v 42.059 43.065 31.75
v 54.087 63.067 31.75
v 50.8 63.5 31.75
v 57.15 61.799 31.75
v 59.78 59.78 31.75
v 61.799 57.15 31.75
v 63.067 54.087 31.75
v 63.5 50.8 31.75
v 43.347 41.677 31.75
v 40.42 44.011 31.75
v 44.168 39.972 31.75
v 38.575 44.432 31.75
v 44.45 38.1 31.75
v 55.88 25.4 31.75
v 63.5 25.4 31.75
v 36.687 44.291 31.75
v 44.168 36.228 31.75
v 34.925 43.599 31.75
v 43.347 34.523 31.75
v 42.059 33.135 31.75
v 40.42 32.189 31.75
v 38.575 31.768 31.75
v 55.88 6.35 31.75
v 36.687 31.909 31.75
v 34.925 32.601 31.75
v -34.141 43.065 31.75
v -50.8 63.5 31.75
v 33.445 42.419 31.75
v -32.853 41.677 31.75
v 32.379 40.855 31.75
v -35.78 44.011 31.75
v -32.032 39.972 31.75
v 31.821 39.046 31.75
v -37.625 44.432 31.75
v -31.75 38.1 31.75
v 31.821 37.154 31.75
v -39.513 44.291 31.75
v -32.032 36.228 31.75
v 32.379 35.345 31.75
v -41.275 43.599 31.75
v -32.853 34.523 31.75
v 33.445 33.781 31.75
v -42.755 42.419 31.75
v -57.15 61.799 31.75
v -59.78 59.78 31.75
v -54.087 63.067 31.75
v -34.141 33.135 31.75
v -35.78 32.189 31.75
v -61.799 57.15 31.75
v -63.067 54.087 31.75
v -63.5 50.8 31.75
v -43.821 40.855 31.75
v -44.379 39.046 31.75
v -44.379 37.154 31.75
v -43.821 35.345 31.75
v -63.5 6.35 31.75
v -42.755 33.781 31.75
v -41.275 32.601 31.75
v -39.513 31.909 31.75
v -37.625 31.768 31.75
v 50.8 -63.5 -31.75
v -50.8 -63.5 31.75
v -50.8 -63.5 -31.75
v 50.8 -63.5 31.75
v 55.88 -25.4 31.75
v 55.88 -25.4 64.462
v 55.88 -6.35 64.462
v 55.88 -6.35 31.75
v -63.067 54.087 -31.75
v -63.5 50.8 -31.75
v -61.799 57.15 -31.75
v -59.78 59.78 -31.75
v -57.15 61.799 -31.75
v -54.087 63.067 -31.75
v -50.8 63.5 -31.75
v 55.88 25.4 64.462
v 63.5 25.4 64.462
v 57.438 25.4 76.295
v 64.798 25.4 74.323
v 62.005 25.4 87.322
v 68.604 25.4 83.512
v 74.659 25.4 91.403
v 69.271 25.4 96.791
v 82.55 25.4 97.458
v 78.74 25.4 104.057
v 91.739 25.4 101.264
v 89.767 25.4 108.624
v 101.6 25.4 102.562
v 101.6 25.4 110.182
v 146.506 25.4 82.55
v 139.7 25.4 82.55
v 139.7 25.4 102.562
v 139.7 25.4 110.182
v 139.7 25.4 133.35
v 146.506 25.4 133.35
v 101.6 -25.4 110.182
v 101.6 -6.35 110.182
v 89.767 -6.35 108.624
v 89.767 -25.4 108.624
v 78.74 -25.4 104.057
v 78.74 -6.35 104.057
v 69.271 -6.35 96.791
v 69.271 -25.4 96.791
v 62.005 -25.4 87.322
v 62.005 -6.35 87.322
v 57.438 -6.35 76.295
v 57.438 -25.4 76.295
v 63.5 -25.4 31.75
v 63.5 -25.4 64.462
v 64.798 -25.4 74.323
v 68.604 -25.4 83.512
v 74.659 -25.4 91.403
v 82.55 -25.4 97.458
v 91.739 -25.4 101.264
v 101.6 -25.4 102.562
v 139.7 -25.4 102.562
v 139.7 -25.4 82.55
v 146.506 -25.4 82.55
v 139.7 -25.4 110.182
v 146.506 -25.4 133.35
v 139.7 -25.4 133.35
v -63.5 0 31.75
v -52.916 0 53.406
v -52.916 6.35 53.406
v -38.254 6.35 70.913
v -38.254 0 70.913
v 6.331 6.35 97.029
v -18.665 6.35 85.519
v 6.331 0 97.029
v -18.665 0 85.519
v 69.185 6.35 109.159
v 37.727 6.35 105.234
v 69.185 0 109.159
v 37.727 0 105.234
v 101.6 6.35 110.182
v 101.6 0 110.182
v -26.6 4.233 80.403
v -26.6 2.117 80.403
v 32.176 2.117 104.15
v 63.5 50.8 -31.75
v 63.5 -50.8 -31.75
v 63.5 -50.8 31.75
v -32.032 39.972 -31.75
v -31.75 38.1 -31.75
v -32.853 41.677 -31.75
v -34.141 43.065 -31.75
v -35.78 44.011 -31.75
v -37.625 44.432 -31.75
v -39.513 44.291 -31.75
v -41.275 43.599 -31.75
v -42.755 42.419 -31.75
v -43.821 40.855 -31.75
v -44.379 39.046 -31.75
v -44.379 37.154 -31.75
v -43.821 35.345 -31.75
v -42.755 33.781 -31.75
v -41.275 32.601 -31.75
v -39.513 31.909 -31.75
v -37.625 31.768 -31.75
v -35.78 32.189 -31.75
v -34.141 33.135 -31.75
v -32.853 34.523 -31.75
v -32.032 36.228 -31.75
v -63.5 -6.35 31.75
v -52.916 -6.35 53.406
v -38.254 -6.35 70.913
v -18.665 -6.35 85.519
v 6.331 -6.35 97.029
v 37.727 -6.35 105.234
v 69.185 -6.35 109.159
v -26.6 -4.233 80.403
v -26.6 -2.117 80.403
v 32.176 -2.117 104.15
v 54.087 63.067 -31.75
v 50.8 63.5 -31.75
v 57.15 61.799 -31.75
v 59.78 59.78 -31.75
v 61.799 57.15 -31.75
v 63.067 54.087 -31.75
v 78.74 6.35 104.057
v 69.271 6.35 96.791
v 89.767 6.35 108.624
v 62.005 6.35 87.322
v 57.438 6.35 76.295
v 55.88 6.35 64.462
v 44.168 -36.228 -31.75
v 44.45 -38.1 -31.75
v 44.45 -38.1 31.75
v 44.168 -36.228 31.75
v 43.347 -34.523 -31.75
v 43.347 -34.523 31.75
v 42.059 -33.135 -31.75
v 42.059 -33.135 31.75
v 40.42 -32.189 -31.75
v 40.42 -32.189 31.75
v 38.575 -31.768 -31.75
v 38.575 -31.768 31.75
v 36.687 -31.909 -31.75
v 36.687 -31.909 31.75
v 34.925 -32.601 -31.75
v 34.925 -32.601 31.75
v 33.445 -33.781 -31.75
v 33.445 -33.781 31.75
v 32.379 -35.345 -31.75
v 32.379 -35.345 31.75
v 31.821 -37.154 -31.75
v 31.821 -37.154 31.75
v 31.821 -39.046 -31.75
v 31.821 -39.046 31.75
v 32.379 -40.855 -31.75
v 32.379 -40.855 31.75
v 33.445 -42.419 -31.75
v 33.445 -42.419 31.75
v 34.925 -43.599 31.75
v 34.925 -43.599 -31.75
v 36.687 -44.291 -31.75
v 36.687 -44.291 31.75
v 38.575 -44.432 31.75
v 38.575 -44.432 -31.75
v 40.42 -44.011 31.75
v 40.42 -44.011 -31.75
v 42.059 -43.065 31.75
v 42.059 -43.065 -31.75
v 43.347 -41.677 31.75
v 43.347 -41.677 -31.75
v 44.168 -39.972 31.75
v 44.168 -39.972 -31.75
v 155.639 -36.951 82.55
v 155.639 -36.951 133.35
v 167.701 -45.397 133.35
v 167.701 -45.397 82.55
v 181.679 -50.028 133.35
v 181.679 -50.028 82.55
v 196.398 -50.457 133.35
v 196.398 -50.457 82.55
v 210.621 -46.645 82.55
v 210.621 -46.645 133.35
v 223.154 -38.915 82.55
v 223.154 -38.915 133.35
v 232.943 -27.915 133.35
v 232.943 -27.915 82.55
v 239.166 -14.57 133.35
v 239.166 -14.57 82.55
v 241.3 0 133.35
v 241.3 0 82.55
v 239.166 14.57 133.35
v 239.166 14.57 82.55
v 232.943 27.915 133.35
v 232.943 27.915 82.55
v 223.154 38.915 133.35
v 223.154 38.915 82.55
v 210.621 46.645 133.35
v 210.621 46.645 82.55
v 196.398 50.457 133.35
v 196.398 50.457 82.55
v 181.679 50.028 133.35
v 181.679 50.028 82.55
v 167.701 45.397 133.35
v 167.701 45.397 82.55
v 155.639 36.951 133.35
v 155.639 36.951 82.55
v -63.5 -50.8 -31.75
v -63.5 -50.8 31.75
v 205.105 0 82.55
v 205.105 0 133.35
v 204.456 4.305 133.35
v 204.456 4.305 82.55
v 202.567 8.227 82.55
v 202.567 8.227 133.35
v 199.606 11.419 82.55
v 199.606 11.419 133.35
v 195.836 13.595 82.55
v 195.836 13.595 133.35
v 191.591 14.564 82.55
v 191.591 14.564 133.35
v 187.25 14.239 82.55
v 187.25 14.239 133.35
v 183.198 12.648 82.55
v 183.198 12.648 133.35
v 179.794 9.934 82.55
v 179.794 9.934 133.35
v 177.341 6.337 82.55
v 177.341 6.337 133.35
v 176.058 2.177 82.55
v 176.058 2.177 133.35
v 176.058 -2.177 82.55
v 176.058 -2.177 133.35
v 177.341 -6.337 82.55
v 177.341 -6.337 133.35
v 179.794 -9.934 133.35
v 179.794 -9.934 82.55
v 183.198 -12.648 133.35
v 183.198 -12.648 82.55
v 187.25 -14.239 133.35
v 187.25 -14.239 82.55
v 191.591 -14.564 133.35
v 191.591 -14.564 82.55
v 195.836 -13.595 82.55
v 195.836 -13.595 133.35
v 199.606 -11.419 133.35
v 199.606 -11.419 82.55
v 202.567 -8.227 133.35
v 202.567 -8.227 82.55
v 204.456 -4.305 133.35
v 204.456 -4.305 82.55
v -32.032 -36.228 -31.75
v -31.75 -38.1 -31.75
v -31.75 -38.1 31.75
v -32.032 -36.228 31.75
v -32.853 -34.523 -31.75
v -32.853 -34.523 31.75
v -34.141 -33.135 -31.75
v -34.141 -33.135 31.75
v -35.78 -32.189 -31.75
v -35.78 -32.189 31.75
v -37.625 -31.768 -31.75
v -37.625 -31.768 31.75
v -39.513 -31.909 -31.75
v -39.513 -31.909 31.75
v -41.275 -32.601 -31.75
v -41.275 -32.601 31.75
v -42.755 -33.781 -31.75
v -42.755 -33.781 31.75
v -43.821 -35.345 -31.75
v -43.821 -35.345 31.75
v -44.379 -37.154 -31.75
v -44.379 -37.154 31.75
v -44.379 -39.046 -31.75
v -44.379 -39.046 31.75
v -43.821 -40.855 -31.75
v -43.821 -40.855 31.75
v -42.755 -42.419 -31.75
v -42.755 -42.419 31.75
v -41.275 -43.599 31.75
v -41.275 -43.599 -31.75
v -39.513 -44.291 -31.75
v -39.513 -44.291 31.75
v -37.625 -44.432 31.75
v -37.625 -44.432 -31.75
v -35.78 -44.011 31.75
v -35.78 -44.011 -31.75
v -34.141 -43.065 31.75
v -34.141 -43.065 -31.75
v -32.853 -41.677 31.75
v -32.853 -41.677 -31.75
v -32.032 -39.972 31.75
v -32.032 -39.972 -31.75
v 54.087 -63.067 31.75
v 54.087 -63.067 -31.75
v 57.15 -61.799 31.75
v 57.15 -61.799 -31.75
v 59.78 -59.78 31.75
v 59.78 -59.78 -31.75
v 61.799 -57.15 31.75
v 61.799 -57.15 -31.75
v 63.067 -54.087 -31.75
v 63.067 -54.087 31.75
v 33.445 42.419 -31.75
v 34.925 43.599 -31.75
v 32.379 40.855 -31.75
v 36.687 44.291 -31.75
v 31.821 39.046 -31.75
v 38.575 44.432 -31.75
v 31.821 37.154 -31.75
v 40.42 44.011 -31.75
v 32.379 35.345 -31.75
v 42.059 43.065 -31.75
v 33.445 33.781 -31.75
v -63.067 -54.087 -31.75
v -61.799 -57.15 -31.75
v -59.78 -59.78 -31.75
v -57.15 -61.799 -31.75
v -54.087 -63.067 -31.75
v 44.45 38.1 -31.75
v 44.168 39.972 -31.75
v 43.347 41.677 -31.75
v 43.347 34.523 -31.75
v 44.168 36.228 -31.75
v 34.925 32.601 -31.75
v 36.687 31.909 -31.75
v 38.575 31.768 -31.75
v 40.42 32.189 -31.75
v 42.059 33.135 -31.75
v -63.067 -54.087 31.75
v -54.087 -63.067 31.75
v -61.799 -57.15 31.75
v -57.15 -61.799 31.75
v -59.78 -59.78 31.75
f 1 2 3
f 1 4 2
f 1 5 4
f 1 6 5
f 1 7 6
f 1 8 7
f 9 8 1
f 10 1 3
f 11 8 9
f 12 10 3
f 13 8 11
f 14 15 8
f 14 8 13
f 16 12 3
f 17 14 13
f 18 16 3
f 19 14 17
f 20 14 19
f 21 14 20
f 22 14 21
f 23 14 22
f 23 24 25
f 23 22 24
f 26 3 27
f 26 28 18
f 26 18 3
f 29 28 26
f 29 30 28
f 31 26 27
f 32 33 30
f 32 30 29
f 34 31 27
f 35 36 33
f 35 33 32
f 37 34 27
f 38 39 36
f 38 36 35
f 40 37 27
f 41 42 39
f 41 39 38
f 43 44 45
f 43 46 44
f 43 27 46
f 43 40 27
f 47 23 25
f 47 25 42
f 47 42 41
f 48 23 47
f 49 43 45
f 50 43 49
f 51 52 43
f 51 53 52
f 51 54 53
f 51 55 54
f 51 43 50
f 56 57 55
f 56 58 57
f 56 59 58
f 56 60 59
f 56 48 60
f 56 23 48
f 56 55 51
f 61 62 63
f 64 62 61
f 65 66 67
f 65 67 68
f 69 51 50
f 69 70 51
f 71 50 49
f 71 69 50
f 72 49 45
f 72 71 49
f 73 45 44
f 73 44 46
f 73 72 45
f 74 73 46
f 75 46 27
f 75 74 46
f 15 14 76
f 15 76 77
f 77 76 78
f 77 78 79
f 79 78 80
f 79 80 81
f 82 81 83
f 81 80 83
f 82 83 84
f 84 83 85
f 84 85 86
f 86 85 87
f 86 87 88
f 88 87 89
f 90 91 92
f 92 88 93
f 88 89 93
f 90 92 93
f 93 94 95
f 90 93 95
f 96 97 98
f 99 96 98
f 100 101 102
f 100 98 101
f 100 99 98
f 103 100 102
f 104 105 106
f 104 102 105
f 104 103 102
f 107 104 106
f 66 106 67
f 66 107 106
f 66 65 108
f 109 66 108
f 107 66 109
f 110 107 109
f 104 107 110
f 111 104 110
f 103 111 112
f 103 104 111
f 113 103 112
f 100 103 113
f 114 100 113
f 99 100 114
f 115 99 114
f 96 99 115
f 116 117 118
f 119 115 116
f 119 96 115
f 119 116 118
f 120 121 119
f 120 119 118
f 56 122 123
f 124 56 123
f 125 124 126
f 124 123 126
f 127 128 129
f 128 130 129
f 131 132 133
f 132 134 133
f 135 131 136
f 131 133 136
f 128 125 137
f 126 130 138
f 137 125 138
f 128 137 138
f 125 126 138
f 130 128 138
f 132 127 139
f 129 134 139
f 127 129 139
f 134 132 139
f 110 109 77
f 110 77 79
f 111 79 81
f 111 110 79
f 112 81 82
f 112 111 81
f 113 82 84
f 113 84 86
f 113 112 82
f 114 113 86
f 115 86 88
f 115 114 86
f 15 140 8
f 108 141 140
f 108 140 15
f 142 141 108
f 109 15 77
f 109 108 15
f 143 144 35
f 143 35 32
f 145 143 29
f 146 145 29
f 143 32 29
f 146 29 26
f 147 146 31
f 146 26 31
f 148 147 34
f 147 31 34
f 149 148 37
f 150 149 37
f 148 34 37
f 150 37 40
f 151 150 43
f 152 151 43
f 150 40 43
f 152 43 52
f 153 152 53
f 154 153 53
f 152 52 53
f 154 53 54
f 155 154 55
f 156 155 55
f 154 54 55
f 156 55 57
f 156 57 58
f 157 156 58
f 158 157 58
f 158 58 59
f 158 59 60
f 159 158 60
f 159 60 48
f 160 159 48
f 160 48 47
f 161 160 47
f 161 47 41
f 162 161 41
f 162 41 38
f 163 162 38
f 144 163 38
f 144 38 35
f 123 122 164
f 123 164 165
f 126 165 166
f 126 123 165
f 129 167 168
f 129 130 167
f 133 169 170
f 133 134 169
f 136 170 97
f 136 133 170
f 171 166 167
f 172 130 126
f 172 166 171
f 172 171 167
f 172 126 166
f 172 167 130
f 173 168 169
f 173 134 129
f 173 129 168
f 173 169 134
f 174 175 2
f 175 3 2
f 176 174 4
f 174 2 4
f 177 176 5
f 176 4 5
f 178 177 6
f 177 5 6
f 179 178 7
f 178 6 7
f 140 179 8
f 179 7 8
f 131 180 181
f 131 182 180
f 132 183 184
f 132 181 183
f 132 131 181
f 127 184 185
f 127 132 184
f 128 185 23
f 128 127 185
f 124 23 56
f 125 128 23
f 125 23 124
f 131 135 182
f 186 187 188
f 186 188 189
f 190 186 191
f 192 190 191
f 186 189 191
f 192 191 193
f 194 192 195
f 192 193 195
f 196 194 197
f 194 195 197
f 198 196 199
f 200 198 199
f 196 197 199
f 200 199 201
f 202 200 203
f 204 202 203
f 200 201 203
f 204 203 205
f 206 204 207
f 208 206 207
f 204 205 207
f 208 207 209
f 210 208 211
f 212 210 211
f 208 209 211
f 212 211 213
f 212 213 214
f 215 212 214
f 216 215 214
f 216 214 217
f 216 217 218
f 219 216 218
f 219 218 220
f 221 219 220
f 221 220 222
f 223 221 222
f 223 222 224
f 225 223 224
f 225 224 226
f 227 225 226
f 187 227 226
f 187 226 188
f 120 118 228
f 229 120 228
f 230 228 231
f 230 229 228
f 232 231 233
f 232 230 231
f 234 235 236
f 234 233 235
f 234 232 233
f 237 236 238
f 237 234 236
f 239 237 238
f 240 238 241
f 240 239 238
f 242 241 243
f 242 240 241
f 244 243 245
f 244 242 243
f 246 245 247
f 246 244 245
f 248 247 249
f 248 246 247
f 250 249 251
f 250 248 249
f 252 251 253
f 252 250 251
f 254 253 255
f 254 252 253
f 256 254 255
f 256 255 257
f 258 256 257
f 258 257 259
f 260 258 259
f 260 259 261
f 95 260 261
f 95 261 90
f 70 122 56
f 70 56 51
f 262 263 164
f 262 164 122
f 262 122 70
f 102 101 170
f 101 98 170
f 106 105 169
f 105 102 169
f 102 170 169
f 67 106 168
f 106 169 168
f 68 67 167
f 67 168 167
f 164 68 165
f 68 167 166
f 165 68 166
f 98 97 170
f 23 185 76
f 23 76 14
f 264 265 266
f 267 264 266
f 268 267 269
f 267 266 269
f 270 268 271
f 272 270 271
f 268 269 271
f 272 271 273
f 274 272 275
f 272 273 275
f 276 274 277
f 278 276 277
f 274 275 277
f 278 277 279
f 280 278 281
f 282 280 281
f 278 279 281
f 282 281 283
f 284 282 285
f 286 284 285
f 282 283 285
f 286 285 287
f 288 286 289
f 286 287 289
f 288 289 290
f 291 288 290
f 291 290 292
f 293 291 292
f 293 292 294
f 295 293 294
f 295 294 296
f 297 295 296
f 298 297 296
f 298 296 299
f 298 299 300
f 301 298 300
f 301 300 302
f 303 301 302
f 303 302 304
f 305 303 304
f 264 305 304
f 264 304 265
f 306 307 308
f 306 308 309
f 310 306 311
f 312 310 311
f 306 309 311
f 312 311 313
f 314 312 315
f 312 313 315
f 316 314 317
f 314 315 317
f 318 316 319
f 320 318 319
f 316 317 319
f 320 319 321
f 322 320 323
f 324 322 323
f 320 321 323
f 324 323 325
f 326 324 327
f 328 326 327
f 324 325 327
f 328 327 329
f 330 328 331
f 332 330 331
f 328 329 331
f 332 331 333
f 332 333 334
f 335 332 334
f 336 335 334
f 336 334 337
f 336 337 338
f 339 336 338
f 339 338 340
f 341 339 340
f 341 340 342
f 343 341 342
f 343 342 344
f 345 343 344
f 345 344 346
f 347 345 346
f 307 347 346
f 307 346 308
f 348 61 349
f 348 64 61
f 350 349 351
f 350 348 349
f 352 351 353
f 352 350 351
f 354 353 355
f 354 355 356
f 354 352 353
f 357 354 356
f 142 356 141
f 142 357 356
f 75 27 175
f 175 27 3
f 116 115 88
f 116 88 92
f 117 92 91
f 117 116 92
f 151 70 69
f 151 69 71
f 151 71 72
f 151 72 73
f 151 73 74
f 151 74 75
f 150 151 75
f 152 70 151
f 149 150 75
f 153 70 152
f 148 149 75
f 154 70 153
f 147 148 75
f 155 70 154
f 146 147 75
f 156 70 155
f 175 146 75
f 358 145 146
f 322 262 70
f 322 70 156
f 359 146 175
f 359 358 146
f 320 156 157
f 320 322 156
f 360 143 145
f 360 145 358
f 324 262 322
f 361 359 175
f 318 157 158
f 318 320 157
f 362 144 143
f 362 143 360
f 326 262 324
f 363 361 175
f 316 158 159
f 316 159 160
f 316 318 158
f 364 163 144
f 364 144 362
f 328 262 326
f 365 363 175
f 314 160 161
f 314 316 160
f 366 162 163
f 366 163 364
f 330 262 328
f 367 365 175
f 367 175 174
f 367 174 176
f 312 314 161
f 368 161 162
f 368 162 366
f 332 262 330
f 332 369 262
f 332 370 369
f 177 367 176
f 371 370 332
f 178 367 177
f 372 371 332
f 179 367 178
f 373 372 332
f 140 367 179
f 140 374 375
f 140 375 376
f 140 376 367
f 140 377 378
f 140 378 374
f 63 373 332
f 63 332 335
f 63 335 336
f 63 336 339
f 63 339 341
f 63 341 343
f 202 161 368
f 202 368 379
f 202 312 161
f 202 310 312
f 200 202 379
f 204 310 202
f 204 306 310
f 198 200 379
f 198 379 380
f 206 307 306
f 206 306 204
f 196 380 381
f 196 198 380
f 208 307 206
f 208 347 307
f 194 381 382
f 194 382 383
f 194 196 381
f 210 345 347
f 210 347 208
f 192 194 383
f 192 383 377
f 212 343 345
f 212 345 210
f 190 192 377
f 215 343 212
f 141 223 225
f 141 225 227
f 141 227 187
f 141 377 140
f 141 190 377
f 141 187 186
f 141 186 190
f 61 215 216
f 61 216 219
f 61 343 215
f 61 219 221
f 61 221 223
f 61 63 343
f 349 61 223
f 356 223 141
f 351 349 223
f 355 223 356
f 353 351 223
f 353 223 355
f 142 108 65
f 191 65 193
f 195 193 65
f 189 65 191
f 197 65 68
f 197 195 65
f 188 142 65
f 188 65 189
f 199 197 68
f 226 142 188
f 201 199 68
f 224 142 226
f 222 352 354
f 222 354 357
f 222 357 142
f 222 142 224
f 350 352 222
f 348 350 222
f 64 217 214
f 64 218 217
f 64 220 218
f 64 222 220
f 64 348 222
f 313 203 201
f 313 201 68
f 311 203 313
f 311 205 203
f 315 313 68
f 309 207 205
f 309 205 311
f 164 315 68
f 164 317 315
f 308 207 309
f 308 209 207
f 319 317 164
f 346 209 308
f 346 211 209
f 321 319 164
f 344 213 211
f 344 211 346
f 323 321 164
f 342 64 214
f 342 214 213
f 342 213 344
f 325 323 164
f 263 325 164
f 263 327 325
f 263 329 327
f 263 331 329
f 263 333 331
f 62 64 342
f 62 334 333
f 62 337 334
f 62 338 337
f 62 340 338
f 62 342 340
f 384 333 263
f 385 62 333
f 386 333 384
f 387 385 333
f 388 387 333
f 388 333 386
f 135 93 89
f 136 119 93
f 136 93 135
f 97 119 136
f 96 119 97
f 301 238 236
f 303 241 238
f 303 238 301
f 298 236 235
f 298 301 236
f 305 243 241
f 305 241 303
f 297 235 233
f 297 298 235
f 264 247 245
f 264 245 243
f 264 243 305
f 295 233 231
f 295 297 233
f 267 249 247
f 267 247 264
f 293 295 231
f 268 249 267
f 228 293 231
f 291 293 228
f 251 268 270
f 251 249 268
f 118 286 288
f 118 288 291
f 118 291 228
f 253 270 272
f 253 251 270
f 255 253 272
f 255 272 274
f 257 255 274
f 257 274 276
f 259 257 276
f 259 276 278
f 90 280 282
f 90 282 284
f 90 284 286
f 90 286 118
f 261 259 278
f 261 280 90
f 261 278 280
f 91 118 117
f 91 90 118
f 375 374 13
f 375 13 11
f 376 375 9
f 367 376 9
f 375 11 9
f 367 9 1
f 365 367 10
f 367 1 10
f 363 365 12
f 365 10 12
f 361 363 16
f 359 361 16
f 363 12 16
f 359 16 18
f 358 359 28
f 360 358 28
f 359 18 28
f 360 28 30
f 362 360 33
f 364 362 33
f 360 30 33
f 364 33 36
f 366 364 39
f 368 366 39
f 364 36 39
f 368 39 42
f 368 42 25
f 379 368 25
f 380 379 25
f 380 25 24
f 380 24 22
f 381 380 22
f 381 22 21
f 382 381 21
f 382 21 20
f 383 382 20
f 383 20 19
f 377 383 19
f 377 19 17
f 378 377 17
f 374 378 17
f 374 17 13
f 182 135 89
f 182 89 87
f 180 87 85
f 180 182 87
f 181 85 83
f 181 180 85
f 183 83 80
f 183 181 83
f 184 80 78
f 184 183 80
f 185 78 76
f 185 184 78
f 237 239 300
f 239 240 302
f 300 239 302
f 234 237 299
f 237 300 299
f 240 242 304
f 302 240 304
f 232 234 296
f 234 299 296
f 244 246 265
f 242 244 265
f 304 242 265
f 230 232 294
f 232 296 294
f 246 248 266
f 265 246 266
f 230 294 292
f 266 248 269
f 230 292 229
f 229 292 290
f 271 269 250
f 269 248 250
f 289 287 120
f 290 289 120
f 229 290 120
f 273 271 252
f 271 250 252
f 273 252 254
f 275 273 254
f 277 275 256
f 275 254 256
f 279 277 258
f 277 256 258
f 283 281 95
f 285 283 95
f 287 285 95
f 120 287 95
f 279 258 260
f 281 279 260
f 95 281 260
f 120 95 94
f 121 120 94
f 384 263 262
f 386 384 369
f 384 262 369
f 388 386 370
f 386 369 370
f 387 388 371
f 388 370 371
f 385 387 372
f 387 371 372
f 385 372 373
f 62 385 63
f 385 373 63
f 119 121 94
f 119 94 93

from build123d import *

# Parameters (mm, degrees)
F1_DEPTH = 63.5
F2_DEPTH = 25.4
F3_DEPTH = 6.35
F0_W     = 50.8
F0_H     = 50.8
F5_R     = 12.7
F6_R     = 14.605
F7_DEPTH = 165.101
F8_R     = 6.35
F9_DEPTH = 63.501


with BuildPart() as f1:
    # F0 (on Front) → F1 (new body, symmetric)
    with BuildSketch(Plane.XZ):
        Polygon((55.88, 31.75), (-63.5, 31.75), (-63.5, -31.75), (63.5, -31.75), (63.5, 31.75), align=None)
    extrude(amount=F1_DEPTH, both=True)

    # F0 (on Front) → F2 (join, symmetric)
    with BuildSketch(Plane.XZ):
        Polygon((139.7, 133.35), (139.7, 110.18212), (139.7, 102.56212), (139.7, 82.55), (190.5, 82.55), (190.5, 133.35), align=None)
        with BuildLine():
            Line((55.88, 64.46212), (55.88, 31.75))
            Line((55.88, 31.75), (63.5, 31.75))
            Line((63.5, 31.75), (63.5, 64.46212))
            ThreePointArc((63.5, 64.46212), (74.659232, 91.402888), (101.6, 102.56212))
            Line((101.6, 102.56212), (139.7, 102.56212))
            Line((139.7, 102.56212), (139.7, 110.18212))
            Line((139.7, 110.18212), (101.6, 110.18212))
            ThreePointArc((101.6, 110.18212), (69.271078, 96.791042), (55.88, 64.46212))
        make_face()
    extrude(amount=F2_DEPTH, both=True)

    # F0 (on Front) → F3 (join, symmetric)
    with BuildSketch(Plane.XZ):
        with BuildLine():
            add(Edge.make_bspline(
                [(-63.5, 31.75), (-41.28221, 95.252596), (30.595858, 110.611163), (101.6, 110.18212)],
                knots=[0, 0, 0, 0, 182.782952, 182.782952, 182.782952, 182.782952], degree=3))
            Line((-63.5, 31.75), (55.88, 31.75))
            Line((55.88, 31.75), (55.88, 64.46212))
            ThreePointArc((55.88, 64.46212), (69.271078, 96.791042), (101.6, 110.18212))
        make_face()
    extrude(amount=F3_DEPTH, both=True)

    # F0 (on Front) → F4 (revolve)
    with BuildSketch(Plane.XZ):
        with Locations((215.9, 107.95)):
            Rectangle(F0_W, F0_H)
    revolve(axis=Axis((190.5, 0, 107.95), (0, 0, 1)))

    # F5
    f5_edges = [f1.edges().sort_by_distance(p)[0] for p in [
        (63.5, -63.5, 0),
        (-63.5, -63.5, 0),
        (-63.5, 63.5, 0),
        (63.5, 63.5, 0),
    ]]
    fillet(f5_edges, radius=F5_R)

    # F6 (on face) → F7 (cut, through all)
    with BuildSketch(Plane.XY.offset(133.35)):
        with Locations((190.5, 0)):
            Circle(F6_R)
    extrude(amount=-F7_DEPTH, mode=Mode.SUBTRACT)

    # F8 (on face) → F9 (cut, through all)
    with BuildSketch(Plane.XY.offset(31.75)):
        with Locations((-38.1, -38.1)):
            Circle(F8_R)
        with Locations((38.1, -38.1)):
            Circle(F8_R)
        with Locations((38.1, 38.1)):
            Circle(F8_R)
        with Locations((-38.1, 38.1)):
            Circle(F8_R)
    extrude(amount=-F9_DEPTH, mode=Mode.SUBTRACT)


solid = f1.part
